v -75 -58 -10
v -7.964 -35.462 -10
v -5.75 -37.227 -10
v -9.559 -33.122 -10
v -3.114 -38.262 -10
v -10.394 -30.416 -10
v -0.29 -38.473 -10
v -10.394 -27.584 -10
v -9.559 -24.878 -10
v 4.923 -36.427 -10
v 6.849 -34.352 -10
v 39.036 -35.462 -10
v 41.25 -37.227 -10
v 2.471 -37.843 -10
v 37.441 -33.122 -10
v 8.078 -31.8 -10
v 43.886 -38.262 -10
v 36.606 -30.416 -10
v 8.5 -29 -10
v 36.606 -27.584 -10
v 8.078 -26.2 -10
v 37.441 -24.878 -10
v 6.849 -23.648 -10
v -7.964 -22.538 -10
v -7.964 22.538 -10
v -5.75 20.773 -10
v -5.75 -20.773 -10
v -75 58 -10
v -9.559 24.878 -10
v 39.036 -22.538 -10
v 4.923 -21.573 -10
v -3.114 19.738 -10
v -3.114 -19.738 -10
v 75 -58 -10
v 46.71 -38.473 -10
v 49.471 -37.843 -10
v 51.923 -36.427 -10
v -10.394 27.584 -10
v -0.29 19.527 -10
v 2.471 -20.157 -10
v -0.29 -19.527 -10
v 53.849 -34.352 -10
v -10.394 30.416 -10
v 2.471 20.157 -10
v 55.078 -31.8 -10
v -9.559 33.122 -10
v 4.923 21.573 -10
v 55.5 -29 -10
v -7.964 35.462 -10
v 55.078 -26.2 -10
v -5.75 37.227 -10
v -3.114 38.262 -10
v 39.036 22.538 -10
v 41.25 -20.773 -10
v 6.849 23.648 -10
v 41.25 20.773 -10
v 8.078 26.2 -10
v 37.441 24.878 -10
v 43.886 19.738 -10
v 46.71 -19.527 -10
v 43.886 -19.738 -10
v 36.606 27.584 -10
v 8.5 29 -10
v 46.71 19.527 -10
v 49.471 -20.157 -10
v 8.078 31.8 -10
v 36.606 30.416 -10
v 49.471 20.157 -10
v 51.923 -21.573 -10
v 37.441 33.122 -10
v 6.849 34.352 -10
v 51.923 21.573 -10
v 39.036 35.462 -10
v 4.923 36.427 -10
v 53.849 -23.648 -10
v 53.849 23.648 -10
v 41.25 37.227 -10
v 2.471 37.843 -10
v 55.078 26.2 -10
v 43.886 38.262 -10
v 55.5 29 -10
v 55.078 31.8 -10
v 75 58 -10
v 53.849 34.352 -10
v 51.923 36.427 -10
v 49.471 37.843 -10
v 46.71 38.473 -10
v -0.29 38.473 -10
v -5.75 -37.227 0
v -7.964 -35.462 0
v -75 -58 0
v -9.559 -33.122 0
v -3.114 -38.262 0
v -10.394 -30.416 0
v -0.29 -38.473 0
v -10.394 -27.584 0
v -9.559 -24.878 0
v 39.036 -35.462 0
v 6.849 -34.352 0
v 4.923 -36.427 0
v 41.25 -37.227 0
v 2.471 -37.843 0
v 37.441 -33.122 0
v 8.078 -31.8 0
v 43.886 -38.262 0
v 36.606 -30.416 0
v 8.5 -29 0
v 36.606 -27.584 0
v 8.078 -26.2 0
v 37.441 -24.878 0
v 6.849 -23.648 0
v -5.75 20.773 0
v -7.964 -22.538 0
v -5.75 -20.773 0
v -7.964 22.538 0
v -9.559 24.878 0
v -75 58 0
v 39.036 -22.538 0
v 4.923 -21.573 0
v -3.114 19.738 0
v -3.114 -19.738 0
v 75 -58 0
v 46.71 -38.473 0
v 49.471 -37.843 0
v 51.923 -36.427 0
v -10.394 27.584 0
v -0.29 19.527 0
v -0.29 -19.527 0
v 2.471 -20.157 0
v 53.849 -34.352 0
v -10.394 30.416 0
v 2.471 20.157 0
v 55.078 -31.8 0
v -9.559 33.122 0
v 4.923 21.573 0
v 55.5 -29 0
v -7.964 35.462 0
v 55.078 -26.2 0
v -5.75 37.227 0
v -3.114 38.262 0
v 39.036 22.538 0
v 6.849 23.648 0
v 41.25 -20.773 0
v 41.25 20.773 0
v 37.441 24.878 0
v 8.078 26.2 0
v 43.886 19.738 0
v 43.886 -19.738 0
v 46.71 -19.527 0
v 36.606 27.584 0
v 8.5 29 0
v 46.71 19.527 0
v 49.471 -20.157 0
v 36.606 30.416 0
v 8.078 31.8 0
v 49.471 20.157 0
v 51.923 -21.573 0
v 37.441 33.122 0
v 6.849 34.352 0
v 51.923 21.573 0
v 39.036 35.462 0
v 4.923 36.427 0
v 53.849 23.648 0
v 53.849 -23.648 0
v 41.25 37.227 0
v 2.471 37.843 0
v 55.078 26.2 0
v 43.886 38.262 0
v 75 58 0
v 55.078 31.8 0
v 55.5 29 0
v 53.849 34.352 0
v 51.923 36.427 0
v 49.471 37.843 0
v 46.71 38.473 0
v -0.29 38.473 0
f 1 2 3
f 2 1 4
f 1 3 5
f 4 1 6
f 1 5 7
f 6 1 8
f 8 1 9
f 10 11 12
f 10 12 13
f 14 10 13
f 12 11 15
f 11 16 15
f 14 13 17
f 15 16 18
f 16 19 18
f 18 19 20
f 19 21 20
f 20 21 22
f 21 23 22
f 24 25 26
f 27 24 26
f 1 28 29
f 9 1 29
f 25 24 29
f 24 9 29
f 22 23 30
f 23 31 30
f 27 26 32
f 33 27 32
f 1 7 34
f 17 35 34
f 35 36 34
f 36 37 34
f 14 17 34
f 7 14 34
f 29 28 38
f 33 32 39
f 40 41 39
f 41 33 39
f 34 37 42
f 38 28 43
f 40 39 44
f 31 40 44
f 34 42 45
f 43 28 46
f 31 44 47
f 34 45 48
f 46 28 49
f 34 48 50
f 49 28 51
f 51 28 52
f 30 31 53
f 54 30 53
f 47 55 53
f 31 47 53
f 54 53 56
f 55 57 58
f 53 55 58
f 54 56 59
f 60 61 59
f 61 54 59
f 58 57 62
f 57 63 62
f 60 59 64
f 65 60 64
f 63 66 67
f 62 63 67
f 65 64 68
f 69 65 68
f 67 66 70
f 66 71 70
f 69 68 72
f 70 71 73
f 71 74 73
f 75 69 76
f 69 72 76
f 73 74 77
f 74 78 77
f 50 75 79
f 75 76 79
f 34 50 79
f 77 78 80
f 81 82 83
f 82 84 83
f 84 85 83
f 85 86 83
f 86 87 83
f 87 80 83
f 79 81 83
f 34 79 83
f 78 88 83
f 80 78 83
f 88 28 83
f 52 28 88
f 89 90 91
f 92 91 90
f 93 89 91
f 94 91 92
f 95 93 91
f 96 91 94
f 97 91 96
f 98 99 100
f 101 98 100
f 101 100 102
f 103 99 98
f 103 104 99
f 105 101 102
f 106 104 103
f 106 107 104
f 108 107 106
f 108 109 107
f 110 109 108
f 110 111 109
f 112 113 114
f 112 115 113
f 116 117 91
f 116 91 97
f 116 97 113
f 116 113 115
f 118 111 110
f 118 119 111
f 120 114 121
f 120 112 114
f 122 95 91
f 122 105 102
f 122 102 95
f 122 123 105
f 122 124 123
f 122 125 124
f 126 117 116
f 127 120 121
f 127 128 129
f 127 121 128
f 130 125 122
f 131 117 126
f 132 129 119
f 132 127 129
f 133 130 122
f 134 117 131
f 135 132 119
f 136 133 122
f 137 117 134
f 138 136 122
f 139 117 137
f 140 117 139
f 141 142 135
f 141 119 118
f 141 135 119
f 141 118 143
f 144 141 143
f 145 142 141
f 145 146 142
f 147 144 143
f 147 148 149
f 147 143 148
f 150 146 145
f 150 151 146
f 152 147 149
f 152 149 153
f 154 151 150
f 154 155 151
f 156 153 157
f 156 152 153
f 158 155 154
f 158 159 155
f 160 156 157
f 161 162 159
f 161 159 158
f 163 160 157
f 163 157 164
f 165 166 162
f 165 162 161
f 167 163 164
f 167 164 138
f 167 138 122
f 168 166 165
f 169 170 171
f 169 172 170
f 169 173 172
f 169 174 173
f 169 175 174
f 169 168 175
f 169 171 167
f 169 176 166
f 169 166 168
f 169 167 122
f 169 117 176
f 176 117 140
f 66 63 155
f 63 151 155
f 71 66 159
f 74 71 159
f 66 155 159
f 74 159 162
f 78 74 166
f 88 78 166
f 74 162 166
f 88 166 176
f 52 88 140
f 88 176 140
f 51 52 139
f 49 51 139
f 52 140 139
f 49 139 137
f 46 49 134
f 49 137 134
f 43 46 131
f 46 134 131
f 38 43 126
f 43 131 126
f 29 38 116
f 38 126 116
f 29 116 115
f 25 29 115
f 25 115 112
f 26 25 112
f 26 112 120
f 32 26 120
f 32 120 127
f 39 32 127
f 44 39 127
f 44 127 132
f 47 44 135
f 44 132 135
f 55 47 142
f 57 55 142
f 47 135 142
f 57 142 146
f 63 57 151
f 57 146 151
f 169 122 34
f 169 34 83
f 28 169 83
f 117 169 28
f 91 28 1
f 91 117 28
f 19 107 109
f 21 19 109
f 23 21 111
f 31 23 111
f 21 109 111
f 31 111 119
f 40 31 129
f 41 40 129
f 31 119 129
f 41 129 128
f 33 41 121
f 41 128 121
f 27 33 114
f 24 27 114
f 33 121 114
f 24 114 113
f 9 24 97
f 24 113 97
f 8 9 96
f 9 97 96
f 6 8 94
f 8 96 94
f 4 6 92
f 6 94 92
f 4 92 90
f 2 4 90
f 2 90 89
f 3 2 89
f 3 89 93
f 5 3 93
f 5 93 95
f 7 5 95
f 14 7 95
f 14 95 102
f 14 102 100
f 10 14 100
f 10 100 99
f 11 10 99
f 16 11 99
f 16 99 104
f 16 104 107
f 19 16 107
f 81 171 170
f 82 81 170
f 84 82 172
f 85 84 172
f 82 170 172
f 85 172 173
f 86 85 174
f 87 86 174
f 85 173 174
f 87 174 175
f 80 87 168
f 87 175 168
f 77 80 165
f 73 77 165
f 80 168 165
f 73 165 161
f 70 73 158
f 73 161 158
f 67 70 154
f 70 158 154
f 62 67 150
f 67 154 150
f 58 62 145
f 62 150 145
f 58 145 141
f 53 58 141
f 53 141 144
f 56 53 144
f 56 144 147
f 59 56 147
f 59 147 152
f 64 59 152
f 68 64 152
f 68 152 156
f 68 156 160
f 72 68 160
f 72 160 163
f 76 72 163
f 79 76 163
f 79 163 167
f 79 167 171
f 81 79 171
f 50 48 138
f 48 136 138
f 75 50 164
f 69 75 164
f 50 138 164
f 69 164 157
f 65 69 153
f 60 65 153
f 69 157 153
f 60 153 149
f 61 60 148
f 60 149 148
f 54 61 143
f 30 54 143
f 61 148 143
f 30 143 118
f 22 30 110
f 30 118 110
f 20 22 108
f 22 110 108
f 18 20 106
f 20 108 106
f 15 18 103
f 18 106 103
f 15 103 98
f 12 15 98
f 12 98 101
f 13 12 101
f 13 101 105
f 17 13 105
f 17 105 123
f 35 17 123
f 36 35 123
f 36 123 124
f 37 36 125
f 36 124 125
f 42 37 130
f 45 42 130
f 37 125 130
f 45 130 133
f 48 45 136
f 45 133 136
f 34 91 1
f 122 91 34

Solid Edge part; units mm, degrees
sketch "Sketch1" plane through (0, 0, 0) normal (0, 0, 1) x (1, 0, 0)
  line L0 (75, -58) -> (75, 58)
  line L1 (75, 58) -> (-75, 58)
  line L2 (-75, 58) -> (-75, -58)
  line L3 (-75, -58) -> (75, -58)
extrude "Protrusion1" add sketch "Sketch1" against normal blind 10
sketch "Sketch2" plane through (0, 0, 0) normal (0, 0, 1) x (1, 0, 0)
  circle A0 centre (46, 29) radius 9.5
extrude "ExtrudedCutout_1" cut sketch "Sketch2" against normal blind 10
pattern_linear "Pattern1" count 2 spacing 47 along (-1, 0, 0) count 2 spacing 58 along (0, -1, 0) of "ExtrudedCutout_1"
